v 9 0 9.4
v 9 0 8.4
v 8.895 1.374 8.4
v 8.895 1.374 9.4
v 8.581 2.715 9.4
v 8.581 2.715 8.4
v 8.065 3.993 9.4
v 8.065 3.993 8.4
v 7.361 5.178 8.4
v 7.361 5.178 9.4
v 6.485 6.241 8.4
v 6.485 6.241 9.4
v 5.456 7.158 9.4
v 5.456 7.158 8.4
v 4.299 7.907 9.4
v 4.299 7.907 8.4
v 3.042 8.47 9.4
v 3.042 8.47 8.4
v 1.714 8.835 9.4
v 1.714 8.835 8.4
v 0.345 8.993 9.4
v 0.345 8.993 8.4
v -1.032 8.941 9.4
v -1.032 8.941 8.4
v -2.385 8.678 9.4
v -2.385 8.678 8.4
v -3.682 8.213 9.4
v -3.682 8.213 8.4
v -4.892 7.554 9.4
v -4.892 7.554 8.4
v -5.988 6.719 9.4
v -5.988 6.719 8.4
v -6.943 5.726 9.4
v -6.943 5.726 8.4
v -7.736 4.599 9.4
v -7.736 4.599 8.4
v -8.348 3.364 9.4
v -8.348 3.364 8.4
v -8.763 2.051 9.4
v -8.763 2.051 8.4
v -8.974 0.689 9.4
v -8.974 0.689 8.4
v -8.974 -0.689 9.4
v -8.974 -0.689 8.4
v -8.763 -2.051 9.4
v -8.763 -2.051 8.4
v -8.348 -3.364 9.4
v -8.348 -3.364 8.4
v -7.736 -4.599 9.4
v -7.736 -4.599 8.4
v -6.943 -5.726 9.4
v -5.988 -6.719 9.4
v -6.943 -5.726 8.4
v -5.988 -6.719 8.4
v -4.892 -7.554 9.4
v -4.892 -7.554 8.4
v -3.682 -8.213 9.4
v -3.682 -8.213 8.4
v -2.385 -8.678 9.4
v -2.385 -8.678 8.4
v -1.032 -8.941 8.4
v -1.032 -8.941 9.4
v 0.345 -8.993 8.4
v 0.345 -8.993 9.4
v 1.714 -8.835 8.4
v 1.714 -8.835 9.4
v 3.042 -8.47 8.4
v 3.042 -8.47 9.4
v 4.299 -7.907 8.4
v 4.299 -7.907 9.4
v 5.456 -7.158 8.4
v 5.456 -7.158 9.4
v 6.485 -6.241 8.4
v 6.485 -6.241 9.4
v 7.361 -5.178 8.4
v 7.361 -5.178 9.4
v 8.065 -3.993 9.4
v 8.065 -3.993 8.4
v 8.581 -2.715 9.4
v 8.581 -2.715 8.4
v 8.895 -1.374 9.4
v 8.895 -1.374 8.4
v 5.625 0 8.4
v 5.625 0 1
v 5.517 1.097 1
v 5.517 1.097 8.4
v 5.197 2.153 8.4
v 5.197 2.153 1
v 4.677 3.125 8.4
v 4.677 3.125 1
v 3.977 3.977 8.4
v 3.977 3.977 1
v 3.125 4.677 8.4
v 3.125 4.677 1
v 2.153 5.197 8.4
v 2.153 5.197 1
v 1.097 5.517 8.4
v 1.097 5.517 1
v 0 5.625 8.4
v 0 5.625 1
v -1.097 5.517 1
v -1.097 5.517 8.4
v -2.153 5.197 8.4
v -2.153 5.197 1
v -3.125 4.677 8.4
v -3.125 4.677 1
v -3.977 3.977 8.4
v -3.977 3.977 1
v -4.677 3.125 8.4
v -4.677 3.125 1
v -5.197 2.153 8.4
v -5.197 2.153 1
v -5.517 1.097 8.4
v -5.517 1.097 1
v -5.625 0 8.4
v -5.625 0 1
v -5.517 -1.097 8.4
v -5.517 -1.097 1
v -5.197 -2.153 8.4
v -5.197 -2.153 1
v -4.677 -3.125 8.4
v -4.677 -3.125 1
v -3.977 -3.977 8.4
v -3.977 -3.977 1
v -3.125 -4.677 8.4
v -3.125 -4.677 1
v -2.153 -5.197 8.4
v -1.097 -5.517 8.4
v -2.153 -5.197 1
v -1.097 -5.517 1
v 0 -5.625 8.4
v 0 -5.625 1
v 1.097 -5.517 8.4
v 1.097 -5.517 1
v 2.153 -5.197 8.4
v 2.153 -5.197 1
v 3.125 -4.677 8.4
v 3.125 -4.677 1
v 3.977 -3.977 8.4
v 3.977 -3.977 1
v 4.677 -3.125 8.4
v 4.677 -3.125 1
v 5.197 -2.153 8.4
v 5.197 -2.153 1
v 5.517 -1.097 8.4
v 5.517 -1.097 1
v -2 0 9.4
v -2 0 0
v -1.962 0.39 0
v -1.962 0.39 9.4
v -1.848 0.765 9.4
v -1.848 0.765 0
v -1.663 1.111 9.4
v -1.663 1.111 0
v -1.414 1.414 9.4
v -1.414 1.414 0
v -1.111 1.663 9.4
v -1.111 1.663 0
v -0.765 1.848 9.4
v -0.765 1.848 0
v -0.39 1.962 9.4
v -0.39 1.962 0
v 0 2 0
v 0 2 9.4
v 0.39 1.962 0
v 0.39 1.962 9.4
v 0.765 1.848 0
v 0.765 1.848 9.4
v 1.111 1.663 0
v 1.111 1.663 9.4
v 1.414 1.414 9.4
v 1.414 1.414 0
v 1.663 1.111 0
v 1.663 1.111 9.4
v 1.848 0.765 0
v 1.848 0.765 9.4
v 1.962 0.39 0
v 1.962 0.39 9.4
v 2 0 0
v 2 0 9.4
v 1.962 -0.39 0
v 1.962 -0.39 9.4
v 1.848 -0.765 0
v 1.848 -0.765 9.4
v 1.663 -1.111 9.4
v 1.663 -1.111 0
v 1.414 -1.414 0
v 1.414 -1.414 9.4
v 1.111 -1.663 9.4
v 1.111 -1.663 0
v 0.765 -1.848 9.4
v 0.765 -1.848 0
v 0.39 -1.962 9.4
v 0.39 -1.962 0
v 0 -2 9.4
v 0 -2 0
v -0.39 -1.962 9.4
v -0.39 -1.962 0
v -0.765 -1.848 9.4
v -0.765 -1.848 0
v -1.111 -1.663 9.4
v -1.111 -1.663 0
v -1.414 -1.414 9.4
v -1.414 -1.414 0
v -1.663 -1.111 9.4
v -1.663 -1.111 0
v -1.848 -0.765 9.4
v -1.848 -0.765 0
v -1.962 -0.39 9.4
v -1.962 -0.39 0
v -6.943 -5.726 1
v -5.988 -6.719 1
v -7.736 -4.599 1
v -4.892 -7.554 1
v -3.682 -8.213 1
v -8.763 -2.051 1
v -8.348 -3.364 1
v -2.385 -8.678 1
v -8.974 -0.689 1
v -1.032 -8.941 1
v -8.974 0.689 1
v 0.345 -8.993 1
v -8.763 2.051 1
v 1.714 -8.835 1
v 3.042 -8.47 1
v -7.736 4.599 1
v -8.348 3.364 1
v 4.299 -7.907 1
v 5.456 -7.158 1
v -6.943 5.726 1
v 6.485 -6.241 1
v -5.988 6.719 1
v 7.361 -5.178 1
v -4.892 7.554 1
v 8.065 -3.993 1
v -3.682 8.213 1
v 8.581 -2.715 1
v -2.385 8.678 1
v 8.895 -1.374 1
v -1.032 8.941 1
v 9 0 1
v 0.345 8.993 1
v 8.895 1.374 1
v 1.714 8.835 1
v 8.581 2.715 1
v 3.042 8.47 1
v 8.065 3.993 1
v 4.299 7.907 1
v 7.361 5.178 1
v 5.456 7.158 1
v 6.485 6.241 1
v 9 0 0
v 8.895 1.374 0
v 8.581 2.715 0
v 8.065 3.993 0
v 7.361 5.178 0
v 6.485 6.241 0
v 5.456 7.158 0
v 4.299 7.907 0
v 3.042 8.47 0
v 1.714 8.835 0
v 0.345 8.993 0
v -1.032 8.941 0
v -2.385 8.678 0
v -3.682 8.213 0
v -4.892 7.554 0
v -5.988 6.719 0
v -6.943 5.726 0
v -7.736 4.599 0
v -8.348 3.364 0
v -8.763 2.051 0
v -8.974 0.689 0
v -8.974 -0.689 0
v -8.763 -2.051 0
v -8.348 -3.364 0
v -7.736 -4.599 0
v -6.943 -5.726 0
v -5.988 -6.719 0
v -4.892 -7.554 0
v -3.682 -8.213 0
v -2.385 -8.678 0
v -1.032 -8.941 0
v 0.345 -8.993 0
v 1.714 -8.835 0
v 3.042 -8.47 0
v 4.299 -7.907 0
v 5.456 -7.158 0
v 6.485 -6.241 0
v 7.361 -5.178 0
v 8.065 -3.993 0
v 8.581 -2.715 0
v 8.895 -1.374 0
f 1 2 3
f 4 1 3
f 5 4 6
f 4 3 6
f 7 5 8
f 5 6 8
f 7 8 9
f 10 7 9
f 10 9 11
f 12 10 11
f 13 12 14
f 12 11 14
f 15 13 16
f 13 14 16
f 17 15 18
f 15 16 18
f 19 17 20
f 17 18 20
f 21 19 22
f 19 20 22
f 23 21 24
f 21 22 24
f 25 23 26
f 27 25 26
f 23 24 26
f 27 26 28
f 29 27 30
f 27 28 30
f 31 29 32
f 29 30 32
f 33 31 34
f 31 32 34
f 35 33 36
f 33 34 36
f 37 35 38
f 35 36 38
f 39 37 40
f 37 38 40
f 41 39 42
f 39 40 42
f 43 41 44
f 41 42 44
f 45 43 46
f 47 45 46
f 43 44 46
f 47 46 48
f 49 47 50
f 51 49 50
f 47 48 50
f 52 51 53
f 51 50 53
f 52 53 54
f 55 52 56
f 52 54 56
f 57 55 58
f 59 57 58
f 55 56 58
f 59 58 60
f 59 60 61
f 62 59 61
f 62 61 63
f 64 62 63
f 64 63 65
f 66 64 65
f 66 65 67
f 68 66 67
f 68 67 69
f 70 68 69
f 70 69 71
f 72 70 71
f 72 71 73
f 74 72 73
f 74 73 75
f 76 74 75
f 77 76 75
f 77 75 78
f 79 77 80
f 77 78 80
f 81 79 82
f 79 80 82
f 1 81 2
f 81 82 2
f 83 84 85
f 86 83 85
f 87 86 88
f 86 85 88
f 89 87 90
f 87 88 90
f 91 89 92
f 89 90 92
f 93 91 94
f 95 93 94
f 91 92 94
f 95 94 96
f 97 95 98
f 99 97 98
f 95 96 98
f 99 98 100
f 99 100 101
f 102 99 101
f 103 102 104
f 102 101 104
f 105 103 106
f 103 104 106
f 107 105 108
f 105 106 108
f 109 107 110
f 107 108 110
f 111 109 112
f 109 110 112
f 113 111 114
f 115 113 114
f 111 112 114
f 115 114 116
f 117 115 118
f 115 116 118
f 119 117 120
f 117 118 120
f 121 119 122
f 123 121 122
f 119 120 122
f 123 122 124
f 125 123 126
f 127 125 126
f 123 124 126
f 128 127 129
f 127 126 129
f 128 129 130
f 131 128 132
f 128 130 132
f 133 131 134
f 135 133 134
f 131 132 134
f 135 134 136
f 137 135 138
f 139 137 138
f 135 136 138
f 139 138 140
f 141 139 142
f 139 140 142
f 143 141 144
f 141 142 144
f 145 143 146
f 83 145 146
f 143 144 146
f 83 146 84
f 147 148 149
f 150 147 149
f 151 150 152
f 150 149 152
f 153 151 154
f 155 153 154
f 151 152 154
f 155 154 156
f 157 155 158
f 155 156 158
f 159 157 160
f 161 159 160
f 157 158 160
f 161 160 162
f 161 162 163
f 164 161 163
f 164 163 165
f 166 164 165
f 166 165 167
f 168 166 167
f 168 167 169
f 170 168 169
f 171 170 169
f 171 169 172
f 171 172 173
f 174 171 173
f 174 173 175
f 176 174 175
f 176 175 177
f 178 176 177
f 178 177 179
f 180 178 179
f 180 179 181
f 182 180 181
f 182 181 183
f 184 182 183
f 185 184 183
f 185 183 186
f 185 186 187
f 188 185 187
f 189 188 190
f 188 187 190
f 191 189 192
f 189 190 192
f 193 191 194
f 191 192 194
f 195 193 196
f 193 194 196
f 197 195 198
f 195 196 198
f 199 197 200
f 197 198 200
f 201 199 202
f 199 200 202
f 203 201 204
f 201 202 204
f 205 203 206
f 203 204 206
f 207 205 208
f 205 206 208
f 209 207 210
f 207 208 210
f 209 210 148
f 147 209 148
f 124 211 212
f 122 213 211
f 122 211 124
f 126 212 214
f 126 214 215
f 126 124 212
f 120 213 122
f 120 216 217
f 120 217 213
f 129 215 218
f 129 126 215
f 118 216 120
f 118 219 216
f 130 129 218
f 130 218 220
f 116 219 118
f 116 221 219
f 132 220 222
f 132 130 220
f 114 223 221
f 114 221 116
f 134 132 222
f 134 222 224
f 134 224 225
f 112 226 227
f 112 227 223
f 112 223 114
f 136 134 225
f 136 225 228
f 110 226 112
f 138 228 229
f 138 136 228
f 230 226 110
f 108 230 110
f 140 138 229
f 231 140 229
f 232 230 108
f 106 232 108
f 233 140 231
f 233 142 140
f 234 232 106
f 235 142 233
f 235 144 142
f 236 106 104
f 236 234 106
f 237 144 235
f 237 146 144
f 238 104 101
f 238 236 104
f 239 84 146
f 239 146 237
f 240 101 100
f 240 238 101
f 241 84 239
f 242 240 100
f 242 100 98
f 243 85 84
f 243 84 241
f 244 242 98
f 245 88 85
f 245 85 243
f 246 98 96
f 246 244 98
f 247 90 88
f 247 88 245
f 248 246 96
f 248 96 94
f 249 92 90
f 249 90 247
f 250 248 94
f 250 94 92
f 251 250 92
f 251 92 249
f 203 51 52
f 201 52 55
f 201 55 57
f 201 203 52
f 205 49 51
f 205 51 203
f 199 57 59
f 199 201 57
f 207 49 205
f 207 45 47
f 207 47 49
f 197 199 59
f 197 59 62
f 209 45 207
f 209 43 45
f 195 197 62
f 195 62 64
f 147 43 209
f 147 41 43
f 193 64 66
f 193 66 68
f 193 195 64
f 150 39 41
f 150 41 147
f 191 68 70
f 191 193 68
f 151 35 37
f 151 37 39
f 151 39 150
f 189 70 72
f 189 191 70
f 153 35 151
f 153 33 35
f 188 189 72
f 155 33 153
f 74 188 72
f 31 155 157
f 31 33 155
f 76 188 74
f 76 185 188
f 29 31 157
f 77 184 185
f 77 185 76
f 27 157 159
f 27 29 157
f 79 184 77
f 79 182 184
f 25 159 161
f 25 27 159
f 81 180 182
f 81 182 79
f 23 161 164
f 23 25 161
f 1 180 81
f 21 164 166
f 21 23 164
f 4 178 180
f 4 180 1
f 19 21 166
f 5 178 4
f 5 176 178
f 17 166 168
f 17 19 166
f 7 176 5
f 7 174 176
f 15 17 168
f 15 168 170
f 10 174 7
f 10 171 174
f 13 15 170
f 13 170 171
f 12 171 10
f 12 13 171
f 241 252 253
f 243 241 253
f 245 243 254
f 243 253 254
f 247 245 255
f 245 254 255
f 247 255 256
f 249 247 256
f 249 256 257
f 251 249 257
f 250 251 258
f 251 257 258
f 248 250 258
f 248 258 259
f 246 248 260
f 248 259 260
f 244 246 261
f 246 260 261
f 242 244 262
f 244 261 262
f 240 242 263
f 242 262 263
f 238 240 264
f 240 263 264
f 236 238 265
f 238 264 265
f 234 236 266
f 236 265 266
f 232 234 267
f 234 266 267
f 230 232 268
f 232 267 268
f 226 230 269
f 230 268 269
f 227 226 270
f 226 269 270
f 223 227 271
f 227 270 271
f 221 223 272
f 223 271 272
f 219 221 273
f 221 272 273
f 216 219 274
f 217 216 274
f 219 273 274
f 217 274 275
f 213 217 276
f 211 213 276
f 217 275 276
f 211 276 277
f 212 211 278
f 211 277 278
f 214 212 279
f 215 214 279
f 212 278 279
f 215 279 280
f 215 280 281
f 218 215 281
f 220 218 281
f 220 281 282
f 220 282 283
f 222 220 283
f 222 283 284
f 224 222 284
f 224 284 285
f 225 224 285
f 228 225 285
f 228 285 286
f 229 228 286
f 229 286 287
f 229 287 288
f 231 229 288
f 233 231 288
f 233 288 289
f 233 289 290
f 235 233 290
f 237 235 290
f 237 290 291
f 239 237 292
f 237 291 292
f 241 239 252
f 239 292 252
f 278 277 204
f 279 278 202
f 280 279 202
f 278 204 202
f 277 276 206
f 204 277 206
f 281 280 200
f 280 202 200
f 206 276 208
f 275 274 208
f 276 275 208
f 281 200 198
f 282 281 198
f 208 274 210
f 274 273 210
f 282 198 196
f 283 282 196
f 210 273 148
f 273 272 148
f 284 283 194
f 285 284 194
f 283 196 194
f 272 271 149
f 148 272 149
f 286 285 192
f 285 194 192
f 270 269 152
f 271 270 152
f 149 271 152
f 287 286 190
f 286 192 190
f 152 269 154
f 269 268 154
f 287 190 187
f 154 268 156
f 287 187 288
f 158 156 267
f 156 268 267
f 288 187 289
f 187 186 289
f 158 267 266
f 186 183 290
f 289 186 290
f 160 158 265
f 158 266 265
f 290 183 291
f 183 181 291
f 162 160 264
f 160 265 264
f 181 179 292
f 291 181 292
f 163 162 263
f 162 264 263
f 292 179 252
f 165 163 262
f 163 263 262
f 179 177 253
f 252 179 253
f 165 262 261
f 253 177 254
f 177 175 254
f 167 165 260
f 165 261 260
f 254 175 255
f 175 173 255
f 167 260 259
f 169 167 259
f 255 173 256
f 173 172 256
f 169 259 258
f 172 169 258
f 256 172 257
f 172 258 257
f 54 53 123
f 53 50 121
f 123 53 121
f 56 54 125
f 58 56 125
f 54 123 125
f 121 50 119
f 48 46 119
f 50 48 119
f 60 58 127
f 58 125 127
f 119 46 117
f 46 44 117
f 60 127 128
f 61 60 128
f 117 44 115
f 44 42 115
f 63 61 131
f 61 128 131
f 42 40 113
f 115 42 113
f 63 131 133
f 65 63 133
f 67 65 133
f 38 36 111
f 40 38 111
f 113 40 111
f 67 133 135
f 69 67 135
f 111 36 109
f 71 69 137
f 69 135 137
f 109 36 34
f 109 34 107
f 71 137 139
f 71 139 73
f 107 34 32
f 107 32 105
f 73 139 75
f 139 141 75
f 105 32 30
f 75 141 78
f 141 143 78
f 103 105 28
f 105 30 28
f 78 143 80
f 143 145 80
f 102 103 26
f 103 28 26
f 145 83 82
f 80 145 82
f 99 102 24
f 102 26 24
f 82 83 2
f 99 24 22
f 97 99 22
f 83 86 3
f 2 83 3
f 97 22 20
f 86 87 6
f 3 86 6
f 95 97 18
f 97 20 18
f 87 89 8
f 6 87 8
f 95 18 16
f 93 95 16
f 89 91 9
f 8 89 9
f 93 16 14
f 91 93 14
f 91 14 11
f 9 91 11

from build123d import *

# Parameters (mm, degrees)
F0_R     = 9
F1_DEPTH = 1
F2_R     = 5.625
F3_DEPTH = 7.4
F4_R     = 9
F5_DEPTH = 1
F7_D     = 4


with BuildPart() as f1:
    # F0 (on Top) → F1 (new body)
    with BuildSketch(Plane.XY):
        Circle(F0_R)
    extrude(amount=F1_DEPTH)

    # F2 (on face) → F3 (join)
    with BuildSketch(Plane.XY.offset(1)):
        Circle(F2_R)
    extrude(amount=F3_DEPTH)

    # F4 (on face) → F5 (join)
    with BuildSketch(Plane.XY.offset(8.4)):
        Circle(F4_R)
    extrude(amount=F5_DEPTH)

    # F7 (through all)
    with Locations(Plane.XY.offset(9.4)):
        with Locations((0, 0)):
            Hole(F7_D / 2)


solid = f1.part
